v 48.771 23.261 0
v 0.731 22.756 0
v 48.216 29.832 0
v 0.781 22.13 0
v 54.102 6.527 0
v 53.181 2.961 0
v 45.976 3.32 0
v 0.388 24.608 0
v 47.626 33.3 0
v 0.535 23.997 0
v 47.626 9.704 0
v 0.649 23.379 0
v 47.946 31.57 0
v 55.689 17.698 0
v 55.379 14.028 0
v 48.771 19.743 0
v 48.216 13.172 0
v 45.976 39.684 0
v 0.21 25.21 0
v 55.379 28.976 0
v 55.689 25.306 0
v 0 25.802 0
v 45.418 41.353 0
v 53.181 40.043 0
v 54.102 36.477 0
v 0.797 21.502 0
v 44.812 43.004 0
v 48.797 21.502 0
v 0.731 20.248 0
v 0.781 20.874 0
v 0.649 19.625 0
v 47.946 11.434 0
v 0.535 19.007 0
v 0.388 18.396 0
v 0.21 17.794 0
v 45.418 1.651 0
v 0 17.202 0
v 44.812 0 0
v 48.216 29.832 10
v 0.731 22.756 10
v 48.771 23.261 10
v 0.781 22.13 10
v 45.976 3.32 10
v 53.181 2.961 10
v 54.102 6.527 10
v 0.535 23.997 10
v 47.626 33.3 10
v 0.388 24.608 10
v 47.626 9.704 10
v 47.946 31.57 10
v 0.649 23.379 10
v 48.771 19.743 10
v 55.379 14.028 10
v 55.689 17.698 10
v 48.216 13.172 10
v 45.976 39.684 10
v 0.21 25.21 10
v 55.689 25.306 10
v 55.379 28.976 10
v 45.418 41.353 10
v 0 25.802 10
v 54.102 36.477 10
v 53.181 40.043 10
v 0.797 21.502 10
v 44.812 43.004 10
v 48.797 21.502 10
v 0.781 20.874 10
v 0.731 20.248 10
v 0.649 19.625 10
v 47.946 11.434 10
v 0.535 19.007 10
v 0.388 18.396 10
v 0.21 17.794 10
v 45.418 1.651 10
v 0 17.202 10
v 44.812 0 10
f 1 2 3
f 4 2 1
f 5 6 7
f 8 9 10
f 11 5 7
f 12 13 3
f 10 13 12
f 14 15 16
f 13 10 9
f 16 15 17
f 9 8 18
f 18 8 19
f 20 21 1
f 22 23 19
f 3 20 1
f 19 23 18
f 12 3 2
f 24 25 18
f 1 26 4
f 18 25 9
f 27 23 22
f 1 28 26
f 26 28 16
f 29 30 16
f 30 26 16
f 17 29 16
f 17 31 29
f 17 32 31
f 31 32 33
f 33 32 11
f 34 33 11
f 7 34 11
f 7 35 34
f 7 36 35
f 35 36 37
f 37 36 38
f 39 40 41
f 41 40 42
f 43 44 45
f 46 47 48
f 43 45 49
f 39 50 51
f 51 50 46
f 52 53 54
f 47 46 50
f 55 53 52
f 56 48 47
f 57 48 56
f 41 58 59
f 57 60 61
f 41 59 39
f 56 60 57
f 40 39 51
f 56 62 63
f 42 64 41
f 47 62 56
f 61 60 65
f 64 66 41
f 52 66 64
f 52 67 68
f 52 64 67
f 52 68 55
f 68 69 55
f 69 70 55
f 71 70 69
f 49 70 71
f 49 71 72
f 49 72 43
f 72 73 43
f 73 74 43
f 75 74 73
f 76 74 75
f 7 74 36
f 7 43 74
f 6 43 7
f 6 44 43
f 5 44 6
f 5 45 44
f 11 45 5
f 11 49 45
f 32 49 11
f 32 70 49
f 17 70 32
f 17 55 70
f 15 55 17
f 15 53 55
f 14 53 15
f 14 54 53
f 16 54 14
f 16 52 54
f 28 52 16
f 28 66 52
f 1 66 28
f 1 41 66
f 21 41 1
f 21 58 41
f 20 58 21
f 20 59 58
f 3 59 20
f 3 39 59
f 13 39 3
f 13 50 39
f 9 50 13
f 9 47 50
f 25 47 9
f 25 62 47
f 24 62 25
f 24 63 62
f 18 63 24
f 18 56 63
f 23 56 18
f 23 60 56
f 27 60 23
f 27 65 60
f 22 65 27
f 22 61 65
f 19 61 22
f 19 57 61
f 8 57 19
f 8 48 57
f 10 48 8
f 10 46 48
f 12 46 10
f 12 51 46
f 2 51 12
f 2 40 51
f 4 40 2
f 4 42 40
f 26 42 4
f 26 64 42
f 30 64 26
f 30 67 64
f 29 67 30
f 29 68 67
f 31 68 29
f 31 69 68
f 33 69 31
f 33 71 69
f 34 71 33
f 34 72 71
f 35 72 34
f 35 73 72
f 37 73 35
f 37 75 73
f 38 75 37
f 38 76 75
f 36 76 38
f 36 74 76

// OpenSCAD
$fn = 32;

// ----------------------------------------------------------------------
// Gear sector: 4 teeth on 42 degrees
// ----------------------------------------------------------------------

// --- parameters (mm) ---
sector_angle = 42;        // sector angle, degrees
root_r = 60;              // root circle radius
tooth_h = 7;              // tooth height over the root circle
teeth = 4;                // number of teeth on the sector
hub_r = 12;               // hub bore radius
plate_t = 10;             // sector thickness, Z
arc_step = 3;             // sampling step of the root/hub arcs, degrees

tip_r = root_r + tooth_h;  // tip circle radius

profile = [[44.812, 0], [45.418, 1.651], [45.976, 3.32], [53.181, 2.961], [54.102, 6.527], [47.626, 9.704], [47.946, 11.434], [48.216, 13.172], [55.379, 14.028], [55.689, 17.698], [48.771, 19.743], [48.797, 21.502], [48.771, 23.261], [55.689, 25.306], [55.379, 28.976], [48.216, 29.832], [47.946, 31.57], [47.626, 33.3], [54.102, 36.477], [53.181, 40.043], [45.976, 39.684], [45.418, 41.353], [44.812, 43.004], [0, 25.802], [0.21, 25.21], [0.388, 24.608], [0.535, 23.997], [0.649, 23.379], [0.731, 22.756], [0.781, 22.13], [0.797, 21.502], [0.781, 20.874], [0.731, 20.248], [0.649, 19.625], [0.535, 19.007], [0.388, 18.396], [0.21, 17.794], [0, 17.202]];  // primary outline, 38 points, counter clockwise

// --- the one profile operation ---
linear_extrude(height = plate_t) polygon(points = profile);
